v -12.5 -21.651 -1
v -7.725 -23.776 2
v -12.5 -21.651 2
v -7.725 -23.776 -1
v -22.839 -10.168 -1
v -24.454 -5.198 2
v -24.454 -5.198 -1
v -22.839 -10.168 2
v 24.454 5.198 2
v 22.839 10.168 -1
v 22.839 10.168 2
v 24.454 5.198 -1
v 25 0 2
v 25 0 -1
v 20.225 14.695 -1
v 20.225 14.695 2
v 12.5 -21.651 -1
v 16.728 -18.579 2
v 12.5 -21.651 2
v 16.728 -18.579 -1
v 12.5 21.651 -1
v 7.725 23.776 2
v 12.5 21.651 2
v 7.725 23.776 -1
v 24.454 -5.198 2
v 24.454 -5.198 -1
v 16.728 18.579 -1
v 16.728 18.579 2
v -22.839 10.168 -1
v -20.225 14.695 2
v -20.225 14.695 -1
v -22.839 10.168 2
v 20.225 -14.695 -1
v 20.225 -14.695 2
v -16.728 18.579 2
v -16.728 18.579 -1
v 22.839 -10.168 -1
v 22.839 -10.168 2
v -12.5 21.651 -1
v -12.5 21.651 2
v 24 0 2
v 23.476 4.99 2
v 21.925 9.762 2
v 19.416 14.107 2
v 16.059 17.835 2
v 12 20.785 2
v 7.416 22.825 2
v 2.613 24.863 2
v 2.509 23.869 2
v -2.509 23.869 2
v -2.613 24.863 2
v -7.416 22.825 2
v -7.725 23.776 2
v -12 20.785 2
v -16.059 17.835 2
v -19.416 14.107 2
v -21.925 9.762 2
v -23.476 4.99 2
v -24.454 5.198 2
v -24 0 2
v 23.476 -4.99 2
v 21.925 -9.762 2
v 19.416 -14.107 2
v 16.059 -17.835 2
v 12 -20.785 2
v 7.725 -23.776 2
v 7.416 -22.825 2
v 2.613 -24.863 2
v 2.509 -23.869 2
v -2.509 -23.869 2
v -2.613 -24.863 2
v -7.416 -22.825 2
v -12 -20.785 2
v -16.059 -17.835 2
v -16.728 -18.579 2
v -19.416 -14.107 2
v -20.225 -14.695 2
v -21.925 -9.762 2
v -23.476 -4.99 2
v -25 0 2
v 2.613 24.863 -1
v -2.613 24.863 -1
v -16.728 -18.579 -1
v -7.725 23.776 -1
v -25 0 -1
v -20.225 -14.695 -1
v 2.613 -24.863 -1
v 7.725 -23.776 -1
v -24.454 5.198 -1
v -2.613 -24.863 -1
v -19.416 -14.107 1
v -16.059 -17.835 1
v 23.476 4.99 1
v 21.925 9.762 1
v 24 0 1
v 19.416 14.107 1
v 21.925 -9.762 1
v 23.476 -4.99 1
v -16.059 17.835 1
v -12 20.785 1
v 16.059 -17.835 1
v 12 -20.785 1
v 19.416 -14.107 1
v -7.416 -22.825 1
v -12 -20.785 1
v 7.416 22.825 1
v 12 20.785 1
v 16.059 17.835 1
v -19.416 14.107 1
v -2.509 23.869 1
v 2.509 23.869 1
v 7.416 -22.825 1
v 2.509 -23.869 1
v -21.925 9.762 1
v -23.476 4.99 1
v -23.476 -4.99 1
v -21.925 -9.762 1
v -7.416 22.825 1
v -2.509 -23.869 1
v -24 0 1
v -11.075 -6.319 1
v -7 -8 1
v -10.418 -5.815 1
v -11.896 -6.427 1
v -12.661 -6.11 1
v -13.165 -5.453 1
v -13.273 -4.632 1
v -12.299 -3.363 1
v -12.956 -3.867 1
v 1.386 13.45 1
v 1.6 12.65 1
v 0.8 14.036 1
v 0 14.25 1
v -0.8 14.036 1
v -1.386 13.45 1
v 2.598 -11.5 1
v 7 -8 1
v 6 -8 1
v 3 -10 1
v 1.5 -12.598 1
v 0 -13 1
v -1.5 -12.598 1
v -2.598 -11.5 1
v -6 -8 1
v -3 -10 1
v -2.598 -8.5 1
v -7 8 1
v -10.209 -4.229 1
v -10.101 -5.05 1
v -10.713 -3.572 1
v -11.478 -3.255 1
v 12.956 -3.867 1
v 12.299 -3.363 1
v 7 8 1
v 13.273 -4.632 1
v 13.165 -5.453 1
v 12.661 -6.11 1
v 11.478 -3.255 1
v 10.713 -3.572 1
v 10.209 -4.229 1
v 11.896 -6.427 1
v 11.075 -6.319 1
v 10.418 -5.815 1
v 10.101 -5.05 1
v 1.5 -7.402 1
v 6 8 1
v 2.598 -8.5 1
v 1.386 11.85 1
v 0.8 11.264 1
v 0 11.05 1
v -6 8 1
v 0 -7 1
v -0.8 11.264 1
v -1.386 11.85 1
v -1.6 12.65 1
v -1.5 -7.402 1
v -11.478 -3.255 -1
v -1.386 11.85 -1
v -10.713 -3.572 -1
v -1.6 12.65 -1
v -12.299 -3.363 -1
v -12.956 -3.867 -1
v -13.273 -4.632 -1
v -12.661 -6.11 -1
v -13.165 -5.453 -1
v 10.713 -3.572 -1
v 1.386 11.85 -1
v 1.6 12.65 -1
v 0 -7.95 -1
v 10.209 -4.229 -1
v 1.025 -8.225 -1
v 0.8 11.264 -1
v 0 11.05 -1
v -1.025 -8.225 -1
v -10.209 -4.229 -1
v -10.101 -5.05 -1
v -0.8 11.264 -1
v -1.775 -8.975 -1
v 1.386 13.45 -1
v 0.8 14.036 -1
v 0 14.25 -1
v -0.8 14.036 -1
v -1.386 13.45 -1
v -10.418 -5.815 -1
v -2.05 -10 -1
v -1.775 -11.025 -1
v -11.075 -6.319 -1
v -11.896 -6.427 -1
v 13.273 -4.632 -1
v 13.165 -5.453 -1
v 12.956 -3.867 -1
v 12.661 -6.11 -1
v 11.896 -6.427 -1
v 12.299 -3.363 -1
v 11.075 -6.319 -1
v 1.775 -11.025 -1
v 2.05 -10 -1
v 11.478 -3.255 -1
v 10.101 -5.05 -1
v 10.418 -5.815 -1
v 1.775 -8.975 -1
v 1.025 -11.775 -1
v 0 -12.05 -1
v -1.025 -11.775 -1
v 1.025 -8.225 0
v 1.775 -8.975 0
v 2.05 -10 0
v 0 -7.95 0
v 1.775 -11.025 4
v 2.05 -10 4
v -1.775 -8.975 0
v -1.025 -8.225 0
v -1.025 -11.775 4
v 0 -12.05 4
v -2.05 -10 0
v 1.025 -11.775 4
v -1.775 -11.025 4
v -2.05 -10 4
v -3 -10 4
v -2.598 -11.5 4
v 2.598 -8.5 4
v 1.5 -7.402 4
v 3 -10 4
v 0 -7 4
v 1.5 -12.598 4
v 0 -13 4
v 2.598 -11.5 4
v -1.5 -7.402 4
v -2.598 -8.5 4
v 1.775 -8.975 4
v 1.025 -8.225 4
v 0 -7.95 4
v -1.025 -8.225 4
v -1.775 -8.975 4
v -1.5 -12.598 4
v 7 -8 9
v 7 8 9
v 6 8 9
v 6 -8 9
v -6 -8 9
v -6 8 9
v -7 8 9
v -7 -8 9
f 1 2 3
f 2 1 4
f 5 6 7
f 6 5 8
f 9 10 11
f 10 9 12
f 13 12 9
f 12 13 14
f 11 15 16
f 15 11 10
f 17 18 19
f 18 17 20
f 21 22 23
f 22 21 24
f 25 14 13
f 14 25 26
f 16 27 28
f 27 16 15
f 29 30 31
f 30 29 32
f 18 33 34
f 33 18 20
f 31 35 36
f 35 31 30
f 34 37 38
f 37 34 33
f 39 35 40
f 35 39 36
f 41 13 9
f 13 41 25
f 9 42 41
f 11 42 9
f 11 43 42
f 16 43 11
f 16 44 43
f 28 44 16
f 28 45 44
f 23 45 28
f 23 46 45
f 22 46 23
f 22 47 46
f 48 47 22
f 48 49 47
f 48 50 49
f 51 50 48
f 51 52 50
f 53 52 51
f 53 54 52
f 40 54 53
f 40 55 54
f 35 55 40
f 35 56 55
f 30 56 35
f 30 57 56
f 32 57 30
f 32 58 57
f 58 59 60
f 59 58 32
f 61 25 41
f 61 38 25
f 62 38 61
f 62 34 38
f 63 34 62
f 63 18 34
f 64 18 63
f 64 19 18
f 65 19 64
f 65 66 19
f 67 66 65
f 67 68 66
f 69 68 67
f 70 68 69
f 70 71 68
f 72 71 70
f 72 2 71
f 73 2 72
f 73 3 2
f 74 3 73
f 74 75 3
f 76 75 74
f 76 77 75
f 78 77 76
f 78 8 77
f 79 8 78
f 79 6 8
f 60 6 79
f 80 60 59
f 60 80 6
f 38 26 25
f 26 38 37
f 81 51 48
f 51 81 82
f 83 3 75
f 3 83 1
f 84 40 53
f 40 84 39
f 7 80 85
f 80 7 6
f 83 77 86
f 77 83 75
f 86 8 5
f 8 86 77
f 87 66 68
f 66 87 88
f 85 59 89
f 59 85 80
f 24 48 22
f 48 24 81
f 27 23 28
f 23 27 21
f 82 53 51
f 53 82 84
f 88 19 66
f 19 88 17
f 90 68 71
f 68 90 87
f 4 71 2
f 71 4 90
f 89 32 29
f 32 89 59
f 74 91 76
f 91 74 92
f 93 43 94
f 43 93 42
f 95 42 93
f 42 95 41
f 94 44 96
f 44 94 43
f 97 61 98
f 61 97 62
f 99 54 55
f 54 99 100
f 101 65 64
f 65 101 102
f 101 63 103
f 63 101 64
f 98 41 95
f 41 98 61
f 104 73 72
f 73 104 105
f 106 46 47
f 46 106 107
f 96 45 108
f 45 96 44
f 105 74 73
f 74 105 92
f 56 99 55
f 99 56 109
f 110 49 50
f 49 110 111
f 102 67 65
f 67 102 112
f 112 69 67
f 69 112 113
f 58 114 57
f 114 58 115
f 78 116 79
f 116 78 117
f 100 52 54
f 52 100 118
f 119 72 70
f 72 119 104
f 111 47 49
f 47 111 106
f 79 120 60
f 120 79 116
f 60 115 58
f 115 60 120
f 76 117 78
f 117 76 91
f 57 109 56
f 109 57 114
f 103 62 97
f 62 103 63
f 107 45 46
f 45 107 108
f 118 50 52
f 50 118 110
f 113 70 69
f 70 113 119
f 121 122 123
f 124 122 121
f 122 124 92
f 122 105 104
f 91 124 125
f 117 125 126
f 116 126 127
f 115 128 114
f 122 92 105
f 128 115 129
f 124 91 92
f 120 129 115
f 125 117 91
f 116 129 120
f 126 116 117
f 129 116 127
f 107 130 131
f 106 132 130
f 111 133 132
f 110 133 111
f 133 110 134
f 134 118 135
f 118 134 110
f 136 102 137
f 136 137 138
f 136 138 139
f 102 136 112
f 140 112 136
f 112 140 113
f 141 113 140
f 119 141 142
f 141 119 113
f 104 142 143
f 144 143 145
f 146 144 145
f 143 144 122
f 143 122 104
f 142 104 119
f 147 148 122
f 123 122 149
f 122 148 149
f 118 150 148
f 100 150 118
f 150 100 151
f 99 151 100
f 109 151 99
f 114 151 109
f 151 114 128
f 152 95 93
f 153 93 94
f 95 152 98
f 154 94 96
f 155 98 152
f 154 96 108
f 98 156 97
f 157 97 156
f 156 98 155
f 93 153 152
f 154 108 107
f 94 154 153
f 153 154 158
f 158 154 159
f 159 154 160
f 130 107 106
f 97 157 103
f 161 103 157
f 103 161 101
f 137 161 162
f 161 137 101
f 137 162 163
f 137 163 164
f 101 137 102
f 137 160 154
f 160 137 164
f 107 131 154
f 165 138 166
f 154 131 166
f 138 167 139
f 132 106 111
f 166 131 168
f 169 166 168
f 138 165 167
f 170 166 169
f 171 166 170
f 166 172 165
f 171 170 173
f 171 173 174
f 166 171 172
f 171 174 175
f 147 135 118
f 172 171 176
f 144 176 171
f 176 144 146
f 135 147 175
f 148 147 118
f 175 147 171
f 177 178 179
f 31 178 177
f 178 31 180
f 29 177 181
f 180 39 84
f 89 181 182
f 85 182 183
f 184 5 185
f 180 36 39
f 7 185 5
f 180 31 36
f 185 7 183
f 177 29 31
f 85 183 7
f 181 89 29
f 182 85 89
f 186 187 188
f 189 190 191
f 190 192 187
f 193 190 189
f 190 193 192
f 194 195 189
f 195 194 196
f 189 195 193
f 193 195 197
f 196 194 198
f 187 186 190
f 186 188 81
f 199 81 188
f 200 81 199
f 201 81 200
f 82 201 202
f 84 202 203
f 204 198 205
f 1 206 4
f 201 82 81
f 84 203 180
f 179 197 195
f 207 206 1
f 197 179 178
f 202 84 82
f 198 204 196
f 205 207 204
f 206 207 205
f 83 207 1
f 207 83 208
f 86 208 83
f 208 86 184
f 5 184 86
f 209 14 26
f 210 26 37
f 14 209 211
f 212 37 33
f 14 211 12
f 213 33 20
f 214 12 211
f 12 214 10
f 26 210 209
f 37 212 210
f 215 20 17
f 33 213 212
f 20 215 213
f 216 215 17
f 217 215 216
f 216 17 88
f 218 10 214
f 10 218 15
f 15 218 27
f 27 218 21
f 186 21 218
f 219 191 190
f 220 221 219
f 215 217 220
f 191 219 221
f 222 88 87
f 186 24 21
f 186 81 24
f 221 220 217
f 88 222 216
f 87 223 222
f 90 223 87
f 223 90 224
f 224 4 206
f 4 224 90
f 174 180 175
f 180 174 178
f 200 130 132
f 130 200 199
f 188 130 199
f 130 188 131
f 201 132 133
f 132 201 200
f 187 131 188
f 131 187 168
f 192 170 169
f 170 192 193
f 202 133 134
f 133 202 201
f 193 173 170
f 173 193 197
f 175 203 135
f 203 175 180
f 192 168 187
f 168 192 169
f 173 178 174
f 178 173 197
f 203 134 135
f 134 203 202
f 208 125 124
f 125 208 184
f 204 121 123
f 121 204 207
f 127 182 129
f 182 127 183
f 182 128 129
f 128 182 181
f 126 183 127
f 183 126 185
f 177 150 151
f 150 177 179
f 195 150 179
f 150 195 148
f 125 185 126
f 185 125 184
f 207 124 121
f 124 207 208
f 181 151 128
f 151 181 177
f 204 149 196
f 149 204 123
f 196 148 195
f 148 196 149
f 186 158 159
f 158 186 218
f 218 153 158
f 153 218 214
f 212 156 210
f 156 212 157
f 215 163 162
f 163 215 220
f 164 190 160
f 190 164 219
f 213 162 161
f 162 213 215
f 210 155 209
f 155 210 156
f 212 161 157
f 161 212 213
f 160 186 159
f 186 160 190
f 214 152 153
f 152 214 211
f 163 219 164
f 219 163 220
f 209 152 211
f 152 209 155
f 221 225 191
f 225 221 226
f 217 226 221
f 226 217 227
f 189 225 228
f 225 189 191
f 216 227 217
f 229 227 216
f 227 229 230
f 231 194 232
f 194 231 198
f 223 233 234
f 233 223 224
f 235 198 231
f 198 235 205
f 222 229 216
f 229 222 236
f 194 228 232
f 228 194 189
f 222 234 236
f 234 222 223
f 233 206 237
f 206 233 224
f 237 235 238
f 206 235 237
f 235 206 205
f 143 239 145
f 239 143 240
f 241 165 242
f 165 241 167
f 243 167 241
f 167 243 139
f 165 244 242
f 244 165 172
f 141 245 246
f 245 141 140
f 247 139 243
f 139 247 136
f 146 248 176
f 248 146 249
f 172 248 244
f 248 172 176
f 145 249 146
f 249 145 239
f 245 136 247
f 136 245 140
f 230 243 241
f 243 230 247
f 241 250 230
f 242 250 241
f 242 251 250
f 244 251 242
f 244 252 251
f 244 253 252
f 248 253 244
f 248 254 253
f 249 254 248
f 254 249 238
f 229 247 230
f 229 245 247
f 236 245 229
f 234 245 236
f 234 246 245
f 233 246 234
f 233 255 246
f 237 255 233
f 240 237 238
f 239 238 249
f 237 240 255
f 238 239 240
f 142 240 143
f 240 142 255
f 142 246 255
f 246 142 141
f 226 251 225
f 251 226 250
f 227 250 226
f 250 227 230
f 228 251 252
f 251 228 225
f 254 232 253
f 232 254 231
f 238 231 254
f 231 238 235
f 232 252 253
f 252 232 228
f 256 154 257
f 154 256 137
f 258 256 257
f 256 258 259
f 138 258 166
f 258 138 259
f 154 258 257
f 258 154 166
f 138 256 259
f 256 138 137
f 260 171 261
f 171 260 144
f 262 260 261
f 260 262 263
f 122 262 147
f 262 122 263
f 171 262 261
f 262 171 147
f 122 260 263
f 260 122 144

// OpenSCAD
// file: common.scad
/*
 * Written by Dermot Tynan, Kalopa Research.
 * GPLv2.
 *
 * All dimensions are in mm.
 */

wall_thickness = 2;

cap_radius = 25;
cap_height = 24;
inner_radius = 14;
screw_post_radius = 3;

gland_position = -10;

wind_shaft_diameter = 4.5;
bearing_height = 5;
bearing_diameter = 13.2;

mast_diameter = 8.1;
mast_collar_length = 20;

rg_angle = 112.5;

/*
 * Define the top/bottom end cap for the piece. The shaft radius is used to specify if the end cap has a shaft hole.
 */
module end_cap(shaft_radius)
{
	union() {
		/*
		 * End Cap
		 */
		if (shaft_radius > 0) {
			difference() {
				color([0.3, 0, 1]) cylinder(r = cap_radius, h = wall_thickness, center = true);
				cylinder(r = shaft_radius, h = wall_thickness + 1, center = true, $fn = 12);
			}
		} else {
			color([0.3, 0, 1]) cylinder(r = cap_radius, h = wall_thickness, center = true);
		}
		/*
		 * Ridge around the end cap.
		 */
		translate([0, 0, wall_thickness / 2])
			difference() {
				color([0.3, 0, 1]) cylinder(r = cap_radius, h = wall_thickness, center = true);
				cylinder(r = cap_radius - 1, h = wall_thickness + 1, center = true);
			}
	}
}

/*
 * Screw holes for mounting to top section...
 */
module m3_screw_hole()
{
	translate([0, inner_radius - screw_post_radius + 3.3/2, 0])
		cylinder(r = 3.2/2, h = wall_thickness + 1, center = true, $fn = 12);
}

module screw_holes()
{
	m3_screw_hole();
	rotate(a = [0, 0, rg_angle])
		m3_screw_hole();
	rotate(a = [0, 0, -rg_angle])
		m3_screw_hole();
}
// main file
/*
 * Written by Dermot Tynan, Kalopa Research.
 * GPLv2.
 *
 * All dimensions are in mm.
 */

include <common.scad>

cable_width = 4.1;

mount_thickness = 1;
mount_width = 16;
mount_height = 9;

module cable_gland()
{
	difference() {
		cylinder(r = 3, h = 4, center = true, $fn = 12);
		cylinder(r = cable_width/2, h = 5, center = true, $fn = 12);
	}
}

module mhl_mounting()
{
	union() {
		/*
		 * End cap and mounting holes.
		 */
		difference()  {
			end_cap(0);
			screw_holes();
			translate([0, gland_position, 2])
				cylinder(r = cable_width/2, h = 8, center = true, $fn = 12);
		}
		/*
		 * Potentiometer stands.
		 */
		translate([6.5, 0, mount_height/2])
			cube([mount_thickness, mount_width, mount_height], center = true);
		translate([-6.5, 0, mount_height/2])
			cube([mount_thickness, mount_width, mount_height], center = true);
		/*
		 * The cable gland.
		 */
		translate([0, gland_position, 2])
			cable_gland();
	}
}

mhl_mounting();
